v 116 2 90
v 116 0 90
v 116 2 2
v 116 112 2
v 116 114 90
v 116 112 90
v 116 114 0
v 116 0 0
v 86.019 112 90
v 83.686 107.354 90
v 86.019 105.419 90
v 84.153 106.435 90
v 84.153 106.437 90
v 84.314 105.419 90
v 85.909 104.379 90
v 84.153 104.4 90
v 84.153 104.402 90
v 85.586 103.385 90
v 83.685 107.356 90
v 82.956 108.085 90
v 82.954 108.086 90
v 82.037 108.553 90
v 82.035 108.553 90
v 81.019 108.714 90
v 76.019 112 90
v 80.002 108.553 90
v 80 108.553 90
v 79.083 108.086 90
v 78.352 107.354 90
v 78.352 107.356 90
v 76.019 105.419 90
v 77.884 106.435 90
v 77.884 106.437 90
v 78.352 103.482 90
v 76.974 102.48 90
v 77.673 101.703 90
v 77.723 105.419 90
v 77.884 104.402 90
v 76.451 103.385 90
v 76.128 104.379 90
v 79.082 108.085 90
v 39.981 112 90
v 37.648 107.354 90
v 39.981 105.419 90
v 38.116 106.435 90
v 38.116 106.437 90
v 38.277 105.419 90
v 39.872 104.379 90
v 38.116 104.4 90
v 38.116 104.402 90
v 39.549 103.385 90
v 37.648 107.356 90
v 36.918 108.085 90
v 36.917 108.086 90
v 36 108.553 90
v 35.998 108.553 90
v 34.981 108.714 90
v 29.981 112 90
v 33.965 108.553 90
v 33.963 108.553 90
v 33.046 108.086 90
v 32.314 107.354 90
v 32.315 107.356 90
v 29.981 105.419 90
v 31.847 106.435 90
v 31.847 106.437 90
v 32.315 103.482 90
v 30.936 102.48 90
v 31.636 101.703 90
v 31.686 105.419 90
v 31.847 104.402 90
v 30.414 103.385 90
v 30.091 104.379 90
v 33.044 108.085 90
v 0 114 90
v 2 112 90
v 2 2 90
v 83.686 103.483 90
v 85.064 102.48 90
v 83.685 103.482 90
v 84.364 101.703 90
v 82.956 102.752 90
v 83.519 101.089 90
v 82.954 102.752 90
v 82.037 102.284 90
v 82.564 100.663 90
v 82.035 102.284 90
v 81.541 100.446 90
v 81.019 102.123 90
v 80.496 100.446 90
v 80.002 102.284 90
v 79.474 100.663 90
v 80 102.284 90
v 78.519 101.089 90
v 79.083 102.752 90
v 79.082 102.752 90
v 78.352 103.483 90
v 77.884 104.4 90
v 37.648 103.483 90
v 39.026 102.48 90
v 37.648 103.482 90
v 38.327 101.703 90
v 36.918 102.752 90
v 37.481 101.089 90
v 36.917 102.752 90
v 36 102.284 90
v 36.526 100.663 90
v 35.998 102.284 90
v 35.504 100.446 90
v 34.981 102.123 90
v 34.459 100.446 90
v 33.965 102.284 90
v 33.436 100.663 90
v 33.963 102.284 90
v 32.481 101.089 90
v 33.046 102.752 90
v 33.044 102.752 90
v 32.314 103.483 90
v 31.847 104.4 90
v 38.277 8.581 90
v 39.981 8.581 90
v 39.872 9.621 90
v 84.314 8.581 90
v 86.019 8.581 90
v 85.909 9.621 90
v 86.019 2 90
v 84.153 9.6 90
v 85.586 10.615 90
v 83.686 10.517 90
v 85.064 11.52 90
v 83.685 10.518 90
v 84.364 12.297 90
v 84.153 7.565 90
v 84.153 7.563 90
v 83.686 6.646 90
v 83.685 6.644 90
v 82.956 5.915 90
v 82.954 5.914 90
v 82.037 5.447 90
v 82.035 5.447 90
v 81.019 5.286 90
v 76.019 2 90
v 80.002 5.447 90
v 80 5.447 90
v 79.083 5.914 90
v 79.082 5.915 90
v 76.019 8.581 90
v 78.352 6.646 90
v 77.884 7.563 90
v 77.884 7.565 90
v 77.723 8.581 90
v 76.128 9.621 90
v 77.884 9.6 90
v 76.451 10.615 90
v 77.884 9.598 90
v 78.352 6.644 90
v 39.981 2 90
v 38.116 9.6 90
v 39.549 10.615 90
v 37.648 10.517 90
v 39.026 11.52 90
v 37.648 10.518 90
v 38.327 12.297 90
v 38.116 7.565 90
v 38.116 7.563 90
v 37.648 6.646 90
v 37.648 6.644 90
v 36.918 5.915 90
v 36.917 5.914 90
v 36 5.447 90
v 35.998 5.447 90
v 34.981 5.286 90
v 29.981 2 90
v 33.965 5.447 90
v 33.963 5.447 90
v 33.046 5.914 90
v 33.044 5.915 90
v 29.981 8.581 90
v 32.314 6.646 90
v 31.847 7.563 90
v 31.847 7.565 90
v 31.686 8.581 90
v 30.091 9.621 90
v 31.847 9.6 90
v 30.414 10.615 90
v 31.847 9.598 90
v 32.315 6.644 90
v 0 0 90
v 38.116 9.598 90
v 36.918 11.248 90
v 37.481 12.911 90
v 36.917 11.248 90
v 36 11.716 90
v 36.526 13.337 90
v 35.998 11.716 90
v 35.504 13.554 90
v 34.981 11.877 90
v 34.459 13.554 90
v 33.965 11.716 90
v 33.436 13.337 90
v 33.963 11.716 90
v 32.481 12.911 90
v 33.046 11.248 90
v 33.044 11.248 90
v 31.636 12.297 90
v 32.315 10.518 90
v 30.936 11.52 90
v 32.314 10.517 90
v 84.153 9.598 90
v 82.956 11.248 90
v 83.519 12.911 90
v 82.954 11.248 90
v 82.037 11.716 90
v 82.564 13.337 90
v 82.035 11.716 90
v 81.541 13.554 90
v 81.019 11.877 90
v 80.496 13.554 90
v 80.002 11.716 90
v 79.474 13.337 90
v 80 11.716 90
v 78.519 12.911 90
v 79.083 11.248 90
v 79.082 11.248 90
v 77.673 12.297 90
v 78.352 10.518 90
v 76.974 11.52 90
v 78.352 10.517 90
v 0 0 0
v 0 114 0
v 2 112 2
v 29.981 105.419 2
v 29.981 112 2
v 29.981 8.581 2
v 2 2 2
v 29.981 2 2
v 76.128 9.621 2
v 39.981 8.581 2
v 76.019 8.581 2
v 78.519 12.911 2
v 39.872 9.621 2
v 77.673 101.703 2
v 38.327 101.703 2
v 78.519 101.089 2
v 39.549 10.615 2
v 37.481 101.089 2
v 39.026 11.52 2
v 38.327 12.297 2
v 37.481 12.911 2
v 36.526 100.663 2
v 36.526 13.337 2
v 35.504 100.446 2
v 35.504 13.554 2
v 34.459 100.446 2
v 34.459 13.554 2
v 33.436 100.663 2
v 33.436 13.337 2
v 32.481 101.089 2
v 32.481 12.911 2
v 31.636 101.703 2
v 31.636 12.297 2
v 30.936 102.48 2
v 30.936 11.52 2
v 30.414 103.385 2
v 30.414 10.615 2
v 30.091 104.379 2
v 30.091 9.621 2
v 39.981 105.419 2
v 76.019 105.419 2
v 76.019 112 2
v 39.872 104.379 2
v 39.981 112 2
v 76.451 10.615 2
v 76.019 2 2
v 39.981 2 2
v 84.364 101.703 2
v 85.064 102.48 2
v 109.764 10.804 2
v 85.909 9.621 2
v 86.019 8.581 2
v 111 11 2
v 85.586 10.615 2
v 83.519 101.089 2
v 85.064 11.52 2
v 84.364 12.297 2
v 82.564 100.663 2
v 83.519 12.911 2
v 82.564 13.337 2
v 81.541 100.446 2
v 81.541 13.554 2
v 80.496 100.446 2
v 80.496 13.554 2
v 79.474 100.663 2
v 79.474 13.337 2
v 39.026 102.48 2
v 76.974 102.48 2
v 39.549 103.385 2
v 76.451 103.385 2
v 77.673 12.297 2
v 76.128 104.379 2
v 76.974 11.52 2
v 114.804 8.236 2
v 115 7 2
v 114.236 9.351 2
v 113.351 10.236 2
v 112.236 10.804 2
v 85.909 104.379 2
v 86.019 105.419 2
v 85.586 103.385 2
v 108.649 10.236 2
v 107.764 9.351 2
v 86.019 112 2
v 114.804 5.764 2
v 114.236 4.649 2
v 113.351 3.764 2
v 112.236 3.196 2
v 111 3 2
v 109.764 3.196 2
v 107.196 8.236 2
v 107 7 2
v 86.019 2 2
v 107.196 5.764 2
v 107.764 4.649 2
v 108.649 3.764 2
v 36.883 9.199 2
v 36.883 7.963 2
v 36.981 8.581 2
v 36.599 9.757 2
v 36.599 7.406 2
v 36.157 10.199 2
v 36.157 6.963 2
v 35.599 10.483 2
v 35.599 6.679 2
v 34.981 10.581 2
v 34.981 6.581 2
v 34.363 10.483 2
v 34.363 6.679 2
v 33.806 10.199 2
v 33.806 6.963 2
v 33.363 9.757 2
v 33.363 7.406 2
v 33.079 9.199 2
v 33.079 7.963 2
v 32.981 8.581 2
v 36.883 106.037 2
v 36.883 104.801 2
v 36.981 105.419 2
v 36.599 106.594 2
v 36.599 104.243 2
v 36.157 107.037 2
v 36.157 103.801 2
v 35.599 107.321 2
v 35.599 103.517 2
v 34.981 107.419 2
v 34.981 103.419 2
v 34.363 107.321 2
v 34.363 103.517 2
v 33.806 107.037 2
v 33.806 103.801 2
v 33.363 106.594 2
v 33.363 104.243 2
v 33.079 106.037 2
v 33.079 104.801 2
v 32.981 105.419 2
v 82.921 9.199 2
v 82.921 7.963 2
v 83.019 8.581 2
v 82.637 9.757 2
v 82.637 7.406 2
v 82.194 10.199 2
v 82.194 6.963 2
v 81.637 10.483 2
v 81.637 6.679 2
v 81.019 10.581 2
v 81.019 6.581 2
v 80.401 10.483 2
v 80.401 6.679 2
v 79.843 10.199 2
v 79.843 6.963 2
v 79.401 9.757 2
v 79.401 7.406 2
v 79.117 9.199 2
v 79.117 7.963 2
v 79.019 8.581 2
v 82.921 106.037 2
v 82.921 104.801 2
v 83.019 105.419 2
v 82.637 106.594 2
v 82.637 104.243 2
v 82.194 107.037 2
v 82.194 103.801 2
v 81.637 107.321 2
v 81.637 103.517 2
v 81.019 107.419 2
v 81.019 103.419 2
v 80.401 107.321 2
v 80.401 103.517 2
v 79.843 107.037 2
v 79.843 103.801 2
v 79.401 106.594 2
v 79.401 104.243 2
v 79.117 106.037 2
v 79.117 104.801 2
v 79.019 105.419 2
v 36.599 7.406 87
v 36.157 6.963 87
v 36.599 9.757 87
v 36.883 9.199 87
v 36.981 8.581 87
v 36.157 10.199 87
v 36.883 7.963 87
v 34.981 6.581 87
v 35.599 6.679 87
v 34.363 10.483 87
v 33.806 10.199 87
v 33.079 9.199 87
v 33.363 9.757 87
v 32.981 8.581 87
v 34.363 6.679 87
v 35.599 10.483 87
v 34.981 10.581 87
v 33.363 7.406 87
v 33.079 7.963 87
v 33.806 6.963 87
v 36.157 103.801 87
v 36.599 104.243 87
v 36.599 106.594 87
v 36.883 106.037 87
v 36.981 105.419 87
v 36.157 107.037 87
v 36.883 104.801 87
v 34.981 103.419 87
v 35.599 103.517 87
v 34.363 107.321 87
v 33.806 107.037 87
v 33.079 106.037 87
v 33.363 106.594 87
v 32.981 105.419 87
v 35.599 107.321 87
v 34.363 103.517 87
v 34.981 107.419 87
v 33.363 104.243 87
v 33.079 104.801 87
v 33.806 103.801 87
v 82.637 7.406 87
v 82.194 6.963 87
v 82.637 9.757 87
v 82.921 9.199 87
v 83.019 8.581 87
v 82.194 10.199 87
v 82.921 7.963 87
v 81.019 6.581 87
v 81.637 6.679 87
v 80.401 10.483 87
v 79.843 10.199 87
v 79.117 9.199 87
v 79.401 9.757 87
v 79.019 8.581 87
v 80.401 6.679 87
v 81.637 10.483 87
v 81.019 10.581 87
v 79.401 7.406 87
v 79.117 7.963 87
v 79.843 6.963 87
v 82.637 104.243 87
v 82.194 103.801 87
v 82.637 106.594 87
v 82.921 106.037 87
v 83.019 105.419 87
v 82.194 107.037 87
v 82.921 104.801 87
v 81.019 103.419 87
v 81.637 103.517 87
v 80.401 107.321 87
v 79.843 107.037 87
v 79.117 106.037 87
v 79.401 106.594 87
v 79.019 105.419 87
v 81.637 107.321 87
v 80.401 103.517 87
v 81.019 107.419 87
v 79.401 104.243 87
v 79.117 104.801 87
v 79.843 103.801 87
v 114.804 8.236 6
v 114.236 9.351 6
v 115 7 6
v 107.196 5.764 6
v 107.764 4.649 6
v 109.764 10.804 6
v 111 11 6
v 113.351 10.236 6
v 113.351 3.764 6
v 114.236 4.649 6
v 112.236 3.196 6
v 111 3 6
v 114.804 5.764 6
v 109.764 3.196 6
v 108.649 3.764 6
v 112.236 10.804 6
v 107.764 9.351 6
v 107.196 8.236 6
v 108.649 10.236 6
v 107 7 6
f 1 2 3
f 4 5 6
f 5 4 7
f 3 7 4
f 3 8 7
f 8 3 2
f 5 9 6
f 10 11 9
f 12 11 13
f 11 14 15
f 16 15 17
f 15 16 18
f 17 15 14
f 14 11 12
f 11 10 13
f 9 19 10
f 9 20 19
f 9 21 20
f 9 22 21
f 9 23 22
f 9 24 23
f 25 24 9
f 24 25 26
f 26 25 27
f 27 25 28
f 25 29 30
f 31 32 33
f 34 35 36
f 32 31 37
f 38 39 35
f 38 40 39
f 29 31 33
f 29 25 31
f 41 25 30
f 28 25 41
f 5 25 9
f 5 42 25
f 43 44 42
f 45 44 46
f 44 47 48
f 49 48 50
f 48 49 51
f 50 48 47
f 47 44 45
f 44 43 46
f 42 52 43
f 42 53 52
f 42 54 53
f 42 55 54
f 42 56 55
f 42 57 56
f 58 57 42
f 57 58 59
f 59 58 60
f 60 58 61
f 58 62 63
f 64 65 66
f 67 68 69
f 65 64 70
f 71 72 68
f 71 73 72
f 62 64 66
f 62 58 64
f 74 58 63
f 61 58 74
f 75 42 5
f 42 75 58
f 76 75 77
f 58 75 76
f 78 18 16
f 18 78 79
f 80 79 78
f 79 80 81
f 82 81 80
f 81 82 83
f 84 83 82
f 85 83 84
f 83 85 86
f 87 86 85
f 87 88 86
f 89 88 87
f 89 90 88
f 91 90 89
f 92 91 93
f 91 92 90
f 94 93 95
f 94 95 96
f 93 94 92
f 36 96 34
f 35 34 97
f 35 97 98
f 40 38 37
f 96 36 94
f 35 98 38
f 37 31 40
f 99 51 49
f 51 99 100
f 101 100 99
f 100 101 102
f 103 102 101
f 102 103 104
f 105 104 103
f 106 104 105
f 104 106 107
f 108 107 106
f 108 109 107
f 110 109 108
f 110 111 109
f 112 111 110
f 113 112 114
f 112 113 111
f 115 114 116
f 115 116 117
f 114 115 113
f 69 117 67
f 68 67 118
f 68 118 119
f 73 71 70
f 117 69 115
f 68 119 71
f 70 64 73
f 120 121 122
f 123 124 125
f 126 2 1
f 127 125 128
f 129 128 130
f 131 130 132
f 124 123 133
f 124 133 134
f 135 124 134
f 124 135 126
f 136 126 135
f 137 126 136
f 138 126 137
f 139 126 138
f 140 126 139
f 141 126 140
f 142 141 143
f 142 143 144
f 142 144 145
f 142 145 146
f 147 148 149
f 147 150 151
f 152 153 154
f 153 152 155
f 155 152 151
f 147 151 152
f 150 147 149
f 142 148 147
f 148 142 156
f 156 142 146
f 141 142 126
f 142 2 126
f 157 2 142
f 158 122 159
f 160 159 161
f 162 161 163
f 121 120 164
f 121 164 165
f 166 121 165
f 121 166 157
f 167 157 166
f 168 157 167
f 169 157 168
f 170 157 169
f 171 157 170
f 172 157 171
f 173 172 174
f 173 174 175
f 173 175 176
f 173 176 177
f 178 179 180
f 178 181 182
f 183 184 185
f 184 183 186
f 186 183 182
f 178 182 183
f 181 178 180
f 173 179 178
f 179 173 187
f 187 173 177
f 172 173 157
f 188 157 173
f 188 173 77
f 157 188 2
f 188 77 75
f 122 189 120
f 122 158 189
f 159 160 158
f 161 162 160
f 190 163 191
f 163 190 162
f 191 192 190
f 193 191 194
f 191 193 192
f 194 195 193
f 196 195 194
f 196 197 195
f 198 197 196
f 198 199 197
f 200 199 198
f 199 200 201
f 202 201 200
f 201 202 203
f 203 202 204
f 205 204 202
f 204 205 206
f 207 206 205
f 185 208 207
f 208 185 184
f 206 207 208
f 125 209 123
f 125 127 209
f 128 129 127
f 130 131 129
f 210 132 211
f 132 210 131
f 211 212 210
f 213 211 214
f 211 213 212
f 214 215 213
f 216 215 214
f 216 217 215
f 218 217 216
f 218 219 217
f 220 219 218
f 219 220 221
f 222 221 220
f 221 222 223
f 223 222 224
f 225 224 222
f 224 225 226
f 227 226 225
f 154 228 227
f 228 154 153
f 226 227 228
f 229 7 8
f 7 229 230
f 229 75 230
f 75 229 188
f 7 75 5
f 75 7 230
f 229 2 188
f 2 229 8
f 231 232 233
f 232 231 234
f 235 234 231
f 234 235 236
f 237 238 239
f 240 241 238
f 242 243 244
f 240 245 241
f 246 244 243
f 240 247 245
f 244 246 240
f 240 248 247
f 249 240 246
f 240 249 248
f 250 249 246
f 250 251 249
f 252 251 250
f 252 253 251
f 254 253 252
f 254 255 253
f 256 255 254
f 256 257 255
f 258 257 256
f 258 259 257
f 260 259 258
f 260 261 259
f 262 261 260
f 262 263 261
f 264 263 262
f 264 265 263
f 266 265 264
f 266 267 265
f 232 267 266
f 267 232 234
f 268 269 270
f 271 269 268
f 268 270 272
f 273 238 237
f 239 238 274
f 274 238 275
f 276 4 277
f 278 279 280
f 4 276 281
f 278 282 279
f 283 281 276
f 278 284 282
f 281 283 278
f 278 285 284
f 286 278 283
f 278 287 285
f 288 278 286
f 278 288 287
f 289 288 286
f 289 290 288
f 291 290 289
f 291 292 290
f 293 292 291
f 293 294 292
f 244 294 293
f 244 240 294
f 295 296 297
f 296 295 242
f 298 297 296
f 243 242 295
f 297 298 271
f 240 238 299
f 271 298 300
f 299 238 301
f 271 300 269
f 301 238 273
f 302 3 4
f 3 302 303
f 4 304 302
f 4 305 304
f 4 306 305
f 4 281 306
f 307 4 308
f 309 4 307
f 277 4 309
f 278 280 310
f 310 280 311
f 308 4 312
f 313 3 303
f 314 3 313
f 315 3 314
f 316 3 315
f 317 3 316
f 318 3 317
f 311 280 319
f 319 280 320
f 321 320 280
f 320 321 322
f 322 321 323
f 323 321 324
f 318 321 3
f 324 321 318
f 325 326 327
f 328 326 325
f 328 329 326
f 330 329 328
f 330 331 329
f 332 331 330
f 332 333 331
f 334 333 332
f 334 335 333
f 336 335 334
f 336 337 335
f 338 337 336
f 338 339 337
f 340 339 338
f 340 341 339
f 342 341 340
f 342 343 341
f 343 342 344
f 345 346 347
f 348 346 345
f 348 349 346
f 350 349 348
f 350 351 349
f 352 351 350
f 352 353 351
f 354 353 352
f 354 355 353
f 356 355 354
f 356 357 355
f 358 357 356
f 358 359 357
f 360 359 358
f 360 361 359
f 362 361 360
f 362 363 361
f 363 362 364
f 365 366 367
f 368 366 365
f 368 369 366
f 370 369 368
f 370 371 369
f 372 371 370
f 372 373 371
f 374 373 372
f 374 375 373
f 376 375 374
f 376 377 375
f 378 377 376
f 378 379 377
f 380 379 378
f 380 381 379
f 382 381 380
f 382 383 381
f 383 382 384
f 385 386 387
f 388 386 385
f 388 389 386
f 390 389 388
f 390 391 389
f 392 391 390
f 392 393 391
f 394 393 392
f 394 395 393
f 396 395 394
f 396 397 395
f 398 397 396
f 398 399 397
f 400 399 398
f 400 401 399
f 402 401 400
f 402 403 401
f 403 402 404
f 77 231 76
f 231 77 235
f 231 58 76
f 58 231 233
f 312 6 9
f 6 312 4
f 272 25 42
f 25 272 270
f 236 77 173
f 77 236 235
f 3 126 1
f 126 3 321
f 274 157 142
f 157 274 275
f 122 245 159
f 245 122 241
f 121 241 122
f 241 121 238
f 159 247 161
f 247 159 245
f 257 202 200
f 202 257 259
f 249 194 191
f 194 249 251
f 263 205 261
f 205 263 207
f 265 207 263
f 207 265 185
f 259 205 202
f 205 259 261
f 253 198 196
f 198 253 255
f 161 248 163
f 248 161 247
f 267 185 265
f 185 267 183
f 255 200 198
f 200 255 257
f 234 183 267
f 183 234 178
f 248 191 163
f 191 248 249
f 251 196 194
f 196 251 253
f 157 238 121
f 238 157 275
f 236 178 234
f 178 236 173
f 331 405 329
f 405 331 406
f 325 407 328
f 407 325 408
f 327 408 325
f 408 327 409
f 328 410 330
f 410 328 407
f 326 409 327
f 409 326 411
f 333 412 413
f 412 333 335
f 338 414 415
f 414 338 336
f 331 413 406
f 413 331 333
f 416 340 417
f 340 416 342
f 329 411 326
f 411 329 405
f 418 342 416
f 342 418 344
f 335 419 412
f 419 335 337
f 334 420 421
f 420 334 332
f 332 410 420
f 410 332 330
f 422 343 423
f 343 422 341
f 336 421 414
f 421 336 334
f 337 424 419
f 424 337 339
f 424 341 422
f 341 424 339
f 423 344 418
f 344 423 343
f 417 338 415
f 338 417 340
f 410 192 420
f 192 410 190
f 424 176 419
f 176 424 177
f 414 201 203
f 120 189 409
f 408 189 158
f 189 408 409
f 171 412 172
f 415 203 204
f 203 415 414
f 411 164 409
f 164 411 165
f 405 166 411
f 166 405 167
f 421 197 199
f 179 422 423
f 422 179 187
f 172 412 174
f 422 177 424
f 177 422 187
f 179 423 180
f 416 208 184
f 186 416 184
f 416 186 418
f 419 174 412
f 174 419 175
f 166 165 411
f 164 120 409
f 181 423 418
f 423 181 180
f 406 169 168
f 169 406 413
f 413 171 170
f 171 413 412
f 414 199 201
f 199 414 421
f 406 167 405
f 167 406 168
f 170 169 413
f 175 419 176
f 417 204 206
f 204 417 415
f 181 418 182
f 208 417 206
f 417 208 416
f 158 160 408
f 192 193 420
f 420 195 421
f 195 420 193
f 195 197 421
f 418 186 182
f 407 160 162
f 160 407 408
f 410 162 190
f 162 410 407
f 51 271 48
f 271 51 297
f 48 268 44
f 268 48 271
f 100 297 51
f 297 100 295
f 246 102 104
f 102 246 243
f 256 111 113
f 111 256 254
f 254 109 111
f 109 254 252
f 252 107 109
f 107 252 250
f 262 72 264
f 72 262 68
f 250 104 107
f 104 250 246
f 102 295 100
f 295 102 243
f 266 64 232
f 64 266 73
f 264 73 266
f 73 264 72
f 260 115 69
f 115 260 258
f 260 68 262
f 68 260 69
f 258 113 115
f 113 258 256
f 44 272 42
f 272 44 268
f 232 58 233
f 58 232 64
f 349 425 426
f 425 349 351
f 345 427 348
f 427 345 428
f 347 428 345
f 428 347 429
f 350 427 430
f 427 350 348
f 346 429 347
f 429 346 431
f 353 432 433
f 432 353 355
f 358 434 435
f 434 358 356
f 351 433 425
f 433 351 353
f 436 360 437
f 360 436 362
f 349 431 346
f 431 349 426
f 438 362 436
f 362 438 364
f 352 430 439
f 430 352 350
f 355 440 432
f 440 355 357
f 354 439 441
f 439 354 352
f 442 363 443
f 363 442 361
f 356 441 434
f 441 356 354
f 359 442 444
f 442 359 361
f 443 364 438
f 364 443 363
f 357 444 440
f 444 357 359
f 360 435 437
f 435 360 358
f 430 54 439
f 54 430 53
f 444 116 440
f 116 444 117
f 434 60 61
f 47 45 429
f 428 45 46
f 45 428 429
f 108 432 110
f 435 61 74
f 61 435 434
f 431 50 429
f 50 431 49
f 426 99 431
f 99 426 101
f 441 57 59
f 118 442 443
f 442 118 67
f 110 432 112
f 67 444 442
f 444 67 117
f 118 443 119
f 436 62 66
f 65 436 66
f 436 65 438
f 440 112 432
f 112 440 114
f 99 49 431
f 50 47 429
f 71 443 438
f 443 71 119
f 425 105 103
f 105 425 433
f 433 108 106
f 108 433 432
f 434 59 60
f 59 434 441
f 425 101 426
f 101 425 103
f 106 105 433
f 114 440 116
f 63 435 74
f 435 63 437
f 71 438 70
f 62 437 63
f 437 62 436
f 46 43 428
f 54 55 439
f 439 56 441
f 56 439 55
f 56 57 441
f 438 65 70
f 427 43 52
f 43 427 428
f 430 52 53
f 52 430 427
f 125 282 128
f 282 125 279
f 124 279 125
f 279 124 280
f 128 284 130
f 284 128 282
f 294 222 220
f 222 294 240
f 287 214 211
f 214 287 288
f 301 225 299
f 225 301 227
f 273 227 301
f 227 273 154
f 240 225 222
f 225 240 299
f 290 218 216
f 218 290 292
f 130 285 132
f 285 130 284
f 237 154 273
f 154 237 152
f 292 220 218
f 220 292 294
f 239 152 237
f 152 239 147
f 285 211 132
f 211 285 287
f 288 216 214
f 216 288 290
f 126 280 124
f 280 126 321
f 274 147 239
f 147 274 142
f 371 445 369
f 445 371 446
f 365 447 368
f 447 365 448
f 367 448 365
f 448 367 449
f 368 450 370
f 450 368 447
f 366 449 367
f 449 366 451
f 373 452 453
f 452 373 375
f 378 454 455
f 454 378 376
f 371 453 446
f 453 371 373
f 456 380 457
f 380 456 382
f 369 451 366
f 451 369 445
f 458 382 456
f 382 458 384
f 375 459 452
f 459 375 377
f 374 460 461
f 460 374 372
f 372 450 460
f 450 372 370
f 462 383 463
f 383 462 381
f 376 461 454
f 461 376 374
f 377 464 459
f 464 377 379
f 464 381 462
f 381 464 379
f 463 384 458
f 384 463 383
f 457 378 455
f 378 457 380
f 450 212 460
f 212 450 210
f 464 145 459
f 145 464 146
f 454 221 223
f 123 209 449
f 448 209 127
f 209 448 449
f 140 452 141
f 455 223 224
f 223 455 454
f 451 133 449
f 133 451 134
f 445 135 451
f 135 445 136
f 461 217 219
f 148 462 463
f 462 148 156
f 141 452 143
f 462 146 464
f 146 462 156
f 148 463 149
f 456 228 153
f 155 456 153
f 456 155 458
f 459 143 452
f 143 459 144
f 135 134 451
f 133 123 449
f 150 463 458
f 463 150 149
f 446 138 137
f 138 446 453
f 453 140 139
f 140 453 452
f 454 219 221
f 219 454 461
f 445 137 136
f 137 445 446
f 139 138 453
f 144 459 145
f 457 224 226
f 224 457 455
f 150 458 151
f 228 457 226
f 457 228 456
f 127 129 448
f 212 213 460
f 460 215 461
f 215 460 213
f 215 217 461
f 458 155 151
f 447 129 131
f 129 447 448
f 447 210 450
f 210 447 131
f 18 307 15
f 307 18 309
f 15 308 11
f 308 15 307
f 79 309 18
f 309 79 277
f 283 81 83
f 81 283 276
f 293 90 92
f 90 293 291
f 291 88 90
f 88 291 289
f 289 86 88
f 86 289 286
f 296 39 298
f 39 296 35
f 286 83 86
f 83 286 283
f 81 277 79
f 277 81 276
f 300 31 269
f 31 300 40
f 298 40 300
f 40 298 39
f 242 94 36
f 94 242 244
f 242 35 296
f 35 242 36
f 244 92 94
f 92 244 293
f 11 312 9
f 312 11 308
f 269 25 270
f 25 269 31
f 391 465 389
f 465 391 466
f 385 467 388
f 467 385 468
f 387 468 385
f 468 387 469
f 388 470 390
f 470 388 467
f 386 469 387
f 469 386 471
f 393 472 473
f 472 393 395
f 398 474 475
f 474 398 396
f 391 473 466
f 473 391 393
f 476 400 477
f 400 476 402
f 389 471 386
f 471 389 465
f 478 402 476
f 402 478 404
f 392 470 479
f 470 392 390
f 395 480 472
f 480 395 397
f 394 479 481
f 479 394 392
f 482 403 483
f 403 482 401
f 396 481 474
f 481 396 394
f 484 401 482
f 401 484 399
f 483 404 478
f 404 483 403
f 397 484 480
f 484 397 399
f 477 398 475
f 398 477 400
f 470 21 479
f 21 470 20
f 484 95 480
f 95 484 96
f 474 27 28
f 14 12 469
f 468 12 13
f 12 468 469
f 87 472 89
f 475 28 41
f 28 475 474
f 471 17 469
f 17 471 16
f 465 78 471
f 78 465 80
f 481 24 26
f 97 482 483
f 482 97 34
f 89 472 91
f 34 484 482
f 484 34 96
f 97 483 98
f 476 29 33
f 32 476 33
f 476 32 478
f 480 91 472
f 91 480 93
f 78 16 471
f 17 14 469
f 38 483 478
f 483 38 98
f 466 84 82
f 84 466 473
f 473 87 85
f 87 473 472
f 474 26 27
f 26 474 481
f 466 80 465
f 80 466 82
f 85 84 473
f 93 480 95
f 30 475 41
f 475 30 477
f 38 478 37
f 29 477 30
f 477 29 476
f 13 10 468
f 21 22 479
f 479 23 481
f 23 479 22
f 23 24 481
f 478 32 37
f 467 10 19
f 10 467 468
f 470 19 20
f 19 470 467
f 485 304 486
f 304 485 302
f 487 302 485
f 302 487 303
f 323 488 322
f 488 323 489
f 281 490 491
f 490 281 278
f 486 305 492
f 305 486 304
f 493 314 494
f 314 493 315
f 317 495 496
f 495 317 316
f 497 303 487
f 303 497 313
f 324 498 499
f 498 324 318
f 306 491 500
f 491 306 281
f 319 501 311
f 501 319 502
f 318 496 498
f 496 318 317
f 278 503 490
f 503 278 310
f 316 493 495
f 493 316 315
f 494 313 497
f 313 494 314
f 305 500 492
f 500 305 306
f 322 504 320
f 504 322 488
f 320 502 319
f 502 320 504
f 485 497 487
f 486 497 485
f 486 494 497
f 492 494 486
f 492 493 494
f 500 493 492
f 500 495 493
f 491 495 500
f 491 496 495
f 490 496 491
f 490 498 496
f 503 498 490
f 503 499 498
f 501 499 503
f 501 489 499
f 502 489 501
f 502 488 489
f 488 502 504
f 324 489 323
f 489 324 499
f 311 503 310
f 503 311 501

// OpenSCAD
// file: SwitchPanel.scad
md=25.4*1.5;
mh=25.4*.75;
hole_dist = 48.41875 * 2;
if(!skip_switch_panel) switch_panel();
module switch_panel() {
echo(str("D: ",md," H: ",mh));
difference(){
  union(){
    translate([-15,-20]) box([90,44,mh],r=3,front=0,bottom=1);
    translate([-15,-20,4]) box([90,4,28],r=3,front=0);
    translate([-15,20,4]) box([90,4,28],r=3,front=0);
    translate([-15,-20,4]) box([6.99,44,28],r=3,front=0);
    translate([67.99,-20,4]) box([6.99,44,28],r=3,front=0);
    translate([4,-20,21]) box([12,4,20],r=1,front=0);
    translate([24,-20,21]) box([12,4,20],r=1,front=0);
    translate([44,-20,21]) box([12,4,20],r=1,front=0);
    *cylinder(d=md,h=mh,$fn=50);
    *translate([-24,-24,19]) cube([48,48,4]);
    *translate([0,0,mh-2]) intersection() {
      cylinder(d1=md,d2=md+2,h=2,$fn=50);
      translate([-2,md*-.5-2]) cube([4,md+4,2]);
    }
  }
  translate([10,-20.01,36]) rotate([-90,0]) cylinder(d=4,h=5,$fn=20);
  translate([30,-20.01,36]) rotate([-90,0]) cylinder(d=4,h=5,$fn=20);
  translate([50,-20.01,36]) rotate([-90,0]) cylinder(d=4,h=5,$fn=20);
  for(x=[0:3]) {
    translate([x*20,23,9]) rotate([-90,0])  rotate([0,0,180]) linear_extrude(2) text(x==3?"C":(x==2?"L":(x==1?"V":"D")),halign="center",valign="center",size=8);
    translate([x*20,4]) switch();
  }
}
*mirror([0,0,1]) {
cube([16,30,10.8]);
translate([8,15,2]) cylinder(d=12.4,h=18.8,$fn=30);
}
}
module switch() {
  translate([0,0,-.01])
    cylinder(d=13,h=mh+.02,$fn=20);
    translate([-8,-15,4]) cube([16,30,20.01]);
}

module box(size,r=1,top=1,bottom=1,left=1,right=1,front=1,back=1)
{
  w=size[0];
  d=size[1];
  h=size[2];
  intersection(){
    cube([w,d,h]);
    minkowski(){
      translate([left?r:0,front?r:0,bottom?r:0]) cube([w-(left?r:0)-(right?r:0),d-(front?r:0)-(back?r:0),h-(top?r:0)-(bottom?r:0)]);
      sphere(r,$fn=30);
    }
  }
}
// main file
skip_wally=1;
skip_switch_panel=1;
include<WALLY_Customizer (original).scad>;
include<SwitchPanel.scad>;

hole_dist = 48.41875 * 2;
switch_offset = 46.0375;
boxw = 116;
boxh = 114;
boxd = 90;

echo(str("Plate Dims: ",solid_plate_width,"x",height_sizes[plate_size]));

*translate([boxw/2-solid_plate_width/2,boxh/2-height_sizes[plate_size]/2,boxd]) wally_customizer();
*translate([boxw+8,boxh/2,10]) rotate([0,-90])
{
  difference(){
    switch_pattern() translate([-8,-16]) cube([18,32,22]);
    switch_pattern() switch();
  }
}
difference(){
  union(){
    cube([boxw,boxh,boxd]);
  }
  translate([2,2,2]) cube([boxw,boxh-4,boxd]);
  *translate([boxw+8,boxh/2,10]) rotate([0,-90]) switch_pattern() switch();
}
translate([boxw-5,7,2]) cylinder(d=8,h=4,$fn=20);
translate([boxw/2-switch_offset/2,boxh/2-hole_dist/2]) for(x=[0:1],y=[0:1])
{
  translate([x*switch_offset, y*hole_dist])
  difference() {
    union(){
      cylinder(d=10,h=boxd,$fn=30);
      if(y==0)
        translate([-5,-8]) cube([10,8,boxd]);
      else
        translate([-5,0]) cube([10,8,boxd]);
    }
    translate([0,0,-.01]) cylinder(d=4,h=boxd+.02,$fn=20);
    translate([0,0,boxd-3]) cylinder(d1=4,d2=6.6,h=3.01,$fn=20);
  }
}
module switch_pattern() {
  translate([0,16]) children(0);
  translate([0,-16]) children(0);
  translate([18,-16]) children(0);
  translate([18,16]) children(0);
}
